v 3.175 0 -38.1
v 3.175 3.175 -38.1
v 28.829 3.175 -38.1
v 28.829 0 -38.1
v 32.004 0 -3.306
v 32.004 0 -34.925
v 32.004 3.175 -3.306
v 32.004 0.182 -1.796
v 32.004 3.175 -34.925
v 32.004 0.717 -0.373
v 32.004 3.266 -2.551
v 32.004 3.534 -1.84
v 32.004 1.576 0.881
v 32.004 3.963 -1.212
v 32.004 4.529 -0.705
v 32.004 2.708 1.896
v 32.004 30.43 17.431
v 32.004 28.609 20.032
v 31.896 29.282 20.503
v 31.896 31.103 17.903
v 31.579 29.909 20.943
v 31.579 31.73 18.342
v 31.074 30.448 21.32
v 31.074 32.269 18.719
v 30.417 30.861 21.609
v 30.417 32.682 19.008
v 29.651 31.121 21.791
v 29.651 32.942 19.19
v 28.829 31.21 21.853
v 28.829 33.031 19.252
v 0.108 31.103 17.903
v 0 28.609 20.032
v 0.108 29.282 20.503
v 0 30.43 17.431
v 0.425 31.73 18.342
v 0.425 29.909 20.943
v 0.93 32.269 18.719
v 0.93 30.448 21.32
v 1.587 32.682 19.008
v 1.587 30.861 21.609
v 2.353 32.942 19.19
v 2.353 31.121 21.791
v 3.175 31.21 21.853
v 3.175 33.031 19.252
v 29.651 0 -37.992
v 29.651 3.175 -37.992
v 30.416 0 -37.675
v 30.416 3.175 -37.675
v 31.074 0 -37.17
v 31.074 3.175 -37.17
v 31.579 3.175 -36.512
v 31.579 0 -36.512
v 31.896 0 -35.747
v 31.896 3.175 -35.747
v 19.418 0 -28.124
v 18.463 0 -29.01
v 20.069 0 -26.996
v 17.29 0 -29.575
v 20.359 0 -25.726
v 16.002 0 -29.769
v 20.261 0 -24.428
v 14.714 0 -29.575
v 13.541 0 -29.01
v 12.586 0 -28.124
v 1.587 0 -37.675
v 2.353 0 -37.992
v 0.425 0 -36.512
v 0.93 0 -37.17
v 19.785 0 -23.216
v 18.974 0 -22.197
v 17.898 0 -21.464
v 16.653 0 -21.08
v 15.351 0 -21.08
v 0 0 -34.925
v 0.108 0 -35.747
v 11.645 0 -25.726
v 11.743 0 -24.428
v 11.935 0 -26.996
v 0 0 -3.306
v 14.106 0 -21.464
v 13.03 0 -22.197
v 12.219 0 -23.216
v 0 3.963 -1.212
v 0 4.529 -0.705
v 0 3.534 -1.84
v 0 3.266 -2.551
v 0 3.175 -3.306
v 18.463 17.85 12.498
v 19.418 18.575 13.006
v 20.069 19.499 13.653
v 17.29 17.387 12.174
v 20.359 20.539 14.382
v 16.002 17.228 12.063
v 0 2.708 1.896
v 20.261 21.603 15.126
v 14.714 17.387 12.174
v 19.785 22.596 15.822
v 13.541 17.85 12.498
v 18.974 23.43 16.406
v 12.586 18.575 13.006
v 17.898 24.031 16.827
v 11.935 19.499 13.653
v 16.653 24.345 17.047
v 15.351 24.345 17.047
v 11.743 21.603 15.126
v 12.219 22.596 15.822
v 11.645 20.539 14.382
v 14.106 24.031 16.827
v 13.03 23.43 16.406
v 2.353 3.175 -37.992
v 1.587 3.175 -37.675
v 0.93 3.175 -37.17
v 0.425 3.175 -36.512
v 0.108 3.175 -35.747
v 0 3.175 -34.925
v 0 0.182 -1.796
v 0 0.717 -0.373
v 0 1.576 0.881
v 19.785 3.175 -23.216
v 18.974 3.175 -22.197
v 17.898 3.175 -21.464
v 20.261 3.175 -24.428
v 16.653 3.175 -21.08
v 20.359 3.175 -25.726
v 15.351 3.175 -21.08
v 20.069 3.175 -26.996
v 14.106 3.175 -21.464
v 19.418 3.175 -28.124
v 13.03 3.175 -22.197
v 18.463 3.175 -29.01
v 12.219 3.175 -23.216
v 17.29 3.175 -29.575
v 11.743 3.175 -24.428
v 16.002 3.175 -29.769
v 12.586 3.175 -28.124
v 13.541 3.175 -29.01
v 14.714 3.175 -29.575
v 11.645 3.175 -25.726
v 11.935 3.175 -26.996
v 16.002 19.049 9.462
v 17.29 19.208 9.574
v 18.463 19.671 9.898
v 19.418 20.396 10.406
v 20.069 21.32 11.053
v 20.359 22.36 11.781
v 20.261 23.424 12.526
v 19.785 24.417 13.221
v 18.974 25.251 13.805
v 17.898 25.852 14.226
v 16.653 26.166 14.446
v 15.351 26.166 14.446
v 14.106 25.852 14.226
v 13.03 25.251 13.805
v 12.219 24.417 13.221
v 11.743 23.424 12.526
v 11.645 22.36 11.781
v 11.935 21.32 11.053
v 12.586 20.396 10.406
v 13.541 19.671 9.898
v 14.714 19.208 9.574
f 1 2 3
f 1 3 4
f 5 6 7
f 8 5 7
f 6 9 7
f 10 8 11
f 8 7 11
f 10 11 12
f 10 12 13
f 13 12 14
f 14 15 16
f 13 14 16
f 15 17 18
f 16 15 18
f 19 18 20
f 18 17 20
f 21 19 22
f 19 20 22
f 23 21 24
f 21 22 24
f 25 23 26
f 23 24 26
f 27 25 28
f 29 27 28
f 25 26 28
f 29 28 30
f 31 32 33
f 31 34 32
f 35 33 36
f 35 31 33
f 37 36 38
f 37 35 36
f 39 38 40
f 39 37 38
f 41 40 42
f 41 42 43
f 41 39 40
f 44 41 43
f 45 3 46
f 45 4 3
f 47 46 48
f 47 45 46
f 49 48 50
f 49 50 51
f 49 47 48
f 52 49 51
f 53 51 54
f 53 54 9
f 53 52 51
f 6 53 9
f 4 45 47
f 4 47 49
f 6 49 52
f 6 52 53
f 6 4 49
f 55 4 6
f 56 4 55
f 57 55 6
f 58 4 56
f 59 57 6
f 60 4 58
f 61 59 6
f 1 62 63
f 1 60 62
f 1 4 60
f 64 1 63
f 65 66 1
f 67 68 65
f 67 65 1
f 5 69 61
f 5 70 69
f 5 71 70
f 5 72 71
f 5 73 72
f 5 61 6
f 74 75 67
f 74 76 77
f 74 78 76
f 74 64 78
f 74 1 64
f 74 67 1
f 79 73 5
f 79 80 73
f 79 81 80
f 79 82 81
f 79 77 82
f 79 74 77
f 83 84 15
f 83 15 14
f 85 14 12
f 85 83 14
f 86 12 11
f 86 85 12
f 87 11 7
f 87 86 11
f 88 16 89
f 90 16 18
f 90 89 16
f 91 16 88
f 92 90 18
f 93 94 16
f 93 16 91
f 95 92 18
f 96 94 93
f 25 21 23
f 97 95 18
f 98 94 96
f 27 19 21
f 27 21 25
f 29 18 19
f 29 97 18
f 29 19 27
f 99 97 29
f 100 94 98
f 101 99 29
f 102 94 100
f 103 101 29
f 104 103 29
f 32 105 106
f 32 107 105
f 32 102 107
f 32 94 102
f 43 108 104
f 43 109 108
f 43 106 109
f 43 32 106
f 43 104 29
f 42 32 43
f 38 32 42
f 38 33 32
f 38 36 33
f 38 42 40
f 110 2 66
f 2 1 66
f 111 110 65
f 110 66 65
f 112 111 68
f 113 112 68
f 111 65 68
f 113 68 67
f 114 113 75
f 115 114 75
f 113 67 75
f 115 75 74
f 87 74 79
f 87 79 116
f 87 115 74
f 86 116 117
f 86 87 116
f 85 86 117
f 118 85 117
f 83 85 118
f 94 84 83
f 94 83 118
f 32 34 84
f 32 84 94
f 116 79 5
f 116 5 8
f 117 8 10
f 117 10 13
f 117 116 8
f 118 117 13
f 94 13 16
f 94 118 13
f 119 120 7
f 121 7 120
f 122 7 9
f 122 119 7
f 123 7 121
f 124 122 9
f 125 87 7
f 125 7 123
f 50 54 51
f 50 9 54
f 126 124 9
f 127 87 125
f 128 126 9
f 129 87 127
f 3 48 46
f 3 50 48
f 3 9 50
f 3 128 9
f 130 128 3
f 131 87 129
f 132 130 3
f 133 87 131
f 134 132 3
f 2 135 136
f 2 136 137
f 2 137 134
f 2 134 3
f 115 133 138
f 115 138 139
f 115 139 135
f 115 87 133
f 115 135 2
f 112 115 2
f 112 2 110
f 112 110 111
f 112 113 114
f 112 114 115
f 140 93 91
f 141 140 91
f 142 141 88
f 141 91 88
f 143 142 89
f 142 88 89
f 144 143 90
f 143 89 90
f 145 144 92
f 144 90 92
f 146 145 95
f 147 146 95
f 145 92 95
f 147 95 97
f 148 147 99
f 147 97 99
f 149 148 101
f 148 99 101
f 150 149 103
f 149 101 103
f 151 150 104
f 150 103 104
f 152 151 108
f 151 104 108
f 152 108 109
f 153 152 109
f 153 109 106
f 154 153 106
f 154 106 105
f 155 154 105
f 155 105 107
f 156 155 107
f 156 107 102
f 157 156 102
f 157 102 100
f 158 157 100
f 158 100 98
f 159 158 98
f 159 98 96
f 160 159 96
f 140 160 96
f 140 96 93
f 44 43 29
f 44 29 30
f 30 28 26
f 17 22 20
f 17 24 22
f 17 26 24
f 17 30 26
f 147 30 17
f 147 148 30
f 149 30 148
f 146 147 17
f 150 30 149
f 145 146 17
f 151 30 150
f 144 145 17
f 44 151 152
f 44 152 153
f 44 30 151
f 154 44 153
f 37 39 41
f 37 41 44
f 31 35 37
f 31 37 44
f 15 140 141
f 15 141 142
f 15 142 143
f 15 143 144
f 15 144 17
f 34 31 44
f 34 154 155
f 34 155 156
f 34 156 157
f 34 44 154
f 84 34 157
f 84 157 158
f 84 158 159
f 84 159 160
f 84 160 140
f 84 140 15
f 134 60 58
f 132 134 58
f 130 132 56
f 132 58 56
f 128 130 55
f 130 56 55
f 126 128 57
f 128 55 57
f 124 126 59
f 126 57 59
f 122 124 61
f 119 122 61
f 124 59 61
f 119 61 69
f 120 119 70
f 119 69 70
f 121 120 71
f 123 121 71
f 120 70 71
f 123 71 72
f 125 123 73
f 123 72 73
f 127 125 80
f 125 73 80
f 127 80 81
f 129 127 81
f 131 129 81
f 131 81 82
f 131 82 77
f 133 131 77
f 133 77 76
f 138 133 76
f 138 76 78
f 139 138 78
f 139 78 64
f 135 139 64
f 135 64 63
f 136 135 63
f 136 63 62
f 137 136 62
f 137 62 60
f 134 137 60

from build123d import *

# Parameters (mm, degrees)
BASE_FLANGE1_DEPTH = 32.004
SKETCH6_R          = 4.3688
CUT_EXTRUDE1_DEPTH = 60.723526665
SKETCH7_R          = 4.3688
CUT_EXTRUDE2_DEPTH = 60.723526665
FILLET1_R          = 3.175


# Sheet-metal steps are written as plain solids
with BuildPart() as part:
    # Sketch1 → Base-Flange1 (new body)
    with BuildSketch(Plane(origin=(0, 0, 0), x_dir=(0, 0, -1), z_dir=(1, 0, 0))):
        with BuildLine():
            Line((38.1, 0), (3.305600771, 0))
            ThreePointArc((3.305600771, 0), (0.373497077, 0.717481209), (-1.89601471, 2.707789629))
            Line((-1.89601471, 2.707789629), (-21.853262225, 31.209692887))
            Line((-21.853262225, 31.209692887), (-19.252454484, 33.030798073))
            Line((-19.252454484, 33.030798073), (0.70479303, 4.528894815))
            ThreePointArc((0.70479303, 4.528894815), (1.839548924, 3.533740605), (3.305600771, 3.175))
            Line((3.305600771, 3.175), (38.1, 3.175))
            Line((38.1, 3.175), (38.1, 0))
        make_face()
    extrude(amount=BASE_FLANGE1_DEPTH)

    # Sketch6 → Cut-Extrude1 (cut, through all)
    with BuildSketch(Plane(origin=(0, 0, 0), x_dir=(1, 0, 0), z_dir=(0, -0.5735764363510502, 0.819152044288989))):
        with Locations(Location((16.002, 25.4, 0), (0, 0, 270))):
            Circle(SKETCH6_R)
    extrude(amount=-CUT_EXTRUDE1_DEPTH, mode=Mode.SUBTRACT)

    # Sketch7 → Cut-Extrude2 (cut, through all)
    with BuildSketch(Plane.XZ):
        with Locations(Location((16.002, -25.4, 0), (0, 0, 270))):
            Circle(SKETCH7_R)
    extrude(amount=-CUT_EXTRUDE2_DEPTH, mode=Mode.SUBTRACT)

    # Fillet1
    fillet1_edges = [part.edges().sort_by_distance(p)[0] for p in [
        (32.004, 32.12024548, 20.552858355),
        (0, 32.12024548, 20.552858355),
        (32.004, 1.5875, -38.1),
        (0, 1.5875, -38.1),
    ]]
    fillet(fillet1_edges, radius=FILLET1_R)


solid = part.part
